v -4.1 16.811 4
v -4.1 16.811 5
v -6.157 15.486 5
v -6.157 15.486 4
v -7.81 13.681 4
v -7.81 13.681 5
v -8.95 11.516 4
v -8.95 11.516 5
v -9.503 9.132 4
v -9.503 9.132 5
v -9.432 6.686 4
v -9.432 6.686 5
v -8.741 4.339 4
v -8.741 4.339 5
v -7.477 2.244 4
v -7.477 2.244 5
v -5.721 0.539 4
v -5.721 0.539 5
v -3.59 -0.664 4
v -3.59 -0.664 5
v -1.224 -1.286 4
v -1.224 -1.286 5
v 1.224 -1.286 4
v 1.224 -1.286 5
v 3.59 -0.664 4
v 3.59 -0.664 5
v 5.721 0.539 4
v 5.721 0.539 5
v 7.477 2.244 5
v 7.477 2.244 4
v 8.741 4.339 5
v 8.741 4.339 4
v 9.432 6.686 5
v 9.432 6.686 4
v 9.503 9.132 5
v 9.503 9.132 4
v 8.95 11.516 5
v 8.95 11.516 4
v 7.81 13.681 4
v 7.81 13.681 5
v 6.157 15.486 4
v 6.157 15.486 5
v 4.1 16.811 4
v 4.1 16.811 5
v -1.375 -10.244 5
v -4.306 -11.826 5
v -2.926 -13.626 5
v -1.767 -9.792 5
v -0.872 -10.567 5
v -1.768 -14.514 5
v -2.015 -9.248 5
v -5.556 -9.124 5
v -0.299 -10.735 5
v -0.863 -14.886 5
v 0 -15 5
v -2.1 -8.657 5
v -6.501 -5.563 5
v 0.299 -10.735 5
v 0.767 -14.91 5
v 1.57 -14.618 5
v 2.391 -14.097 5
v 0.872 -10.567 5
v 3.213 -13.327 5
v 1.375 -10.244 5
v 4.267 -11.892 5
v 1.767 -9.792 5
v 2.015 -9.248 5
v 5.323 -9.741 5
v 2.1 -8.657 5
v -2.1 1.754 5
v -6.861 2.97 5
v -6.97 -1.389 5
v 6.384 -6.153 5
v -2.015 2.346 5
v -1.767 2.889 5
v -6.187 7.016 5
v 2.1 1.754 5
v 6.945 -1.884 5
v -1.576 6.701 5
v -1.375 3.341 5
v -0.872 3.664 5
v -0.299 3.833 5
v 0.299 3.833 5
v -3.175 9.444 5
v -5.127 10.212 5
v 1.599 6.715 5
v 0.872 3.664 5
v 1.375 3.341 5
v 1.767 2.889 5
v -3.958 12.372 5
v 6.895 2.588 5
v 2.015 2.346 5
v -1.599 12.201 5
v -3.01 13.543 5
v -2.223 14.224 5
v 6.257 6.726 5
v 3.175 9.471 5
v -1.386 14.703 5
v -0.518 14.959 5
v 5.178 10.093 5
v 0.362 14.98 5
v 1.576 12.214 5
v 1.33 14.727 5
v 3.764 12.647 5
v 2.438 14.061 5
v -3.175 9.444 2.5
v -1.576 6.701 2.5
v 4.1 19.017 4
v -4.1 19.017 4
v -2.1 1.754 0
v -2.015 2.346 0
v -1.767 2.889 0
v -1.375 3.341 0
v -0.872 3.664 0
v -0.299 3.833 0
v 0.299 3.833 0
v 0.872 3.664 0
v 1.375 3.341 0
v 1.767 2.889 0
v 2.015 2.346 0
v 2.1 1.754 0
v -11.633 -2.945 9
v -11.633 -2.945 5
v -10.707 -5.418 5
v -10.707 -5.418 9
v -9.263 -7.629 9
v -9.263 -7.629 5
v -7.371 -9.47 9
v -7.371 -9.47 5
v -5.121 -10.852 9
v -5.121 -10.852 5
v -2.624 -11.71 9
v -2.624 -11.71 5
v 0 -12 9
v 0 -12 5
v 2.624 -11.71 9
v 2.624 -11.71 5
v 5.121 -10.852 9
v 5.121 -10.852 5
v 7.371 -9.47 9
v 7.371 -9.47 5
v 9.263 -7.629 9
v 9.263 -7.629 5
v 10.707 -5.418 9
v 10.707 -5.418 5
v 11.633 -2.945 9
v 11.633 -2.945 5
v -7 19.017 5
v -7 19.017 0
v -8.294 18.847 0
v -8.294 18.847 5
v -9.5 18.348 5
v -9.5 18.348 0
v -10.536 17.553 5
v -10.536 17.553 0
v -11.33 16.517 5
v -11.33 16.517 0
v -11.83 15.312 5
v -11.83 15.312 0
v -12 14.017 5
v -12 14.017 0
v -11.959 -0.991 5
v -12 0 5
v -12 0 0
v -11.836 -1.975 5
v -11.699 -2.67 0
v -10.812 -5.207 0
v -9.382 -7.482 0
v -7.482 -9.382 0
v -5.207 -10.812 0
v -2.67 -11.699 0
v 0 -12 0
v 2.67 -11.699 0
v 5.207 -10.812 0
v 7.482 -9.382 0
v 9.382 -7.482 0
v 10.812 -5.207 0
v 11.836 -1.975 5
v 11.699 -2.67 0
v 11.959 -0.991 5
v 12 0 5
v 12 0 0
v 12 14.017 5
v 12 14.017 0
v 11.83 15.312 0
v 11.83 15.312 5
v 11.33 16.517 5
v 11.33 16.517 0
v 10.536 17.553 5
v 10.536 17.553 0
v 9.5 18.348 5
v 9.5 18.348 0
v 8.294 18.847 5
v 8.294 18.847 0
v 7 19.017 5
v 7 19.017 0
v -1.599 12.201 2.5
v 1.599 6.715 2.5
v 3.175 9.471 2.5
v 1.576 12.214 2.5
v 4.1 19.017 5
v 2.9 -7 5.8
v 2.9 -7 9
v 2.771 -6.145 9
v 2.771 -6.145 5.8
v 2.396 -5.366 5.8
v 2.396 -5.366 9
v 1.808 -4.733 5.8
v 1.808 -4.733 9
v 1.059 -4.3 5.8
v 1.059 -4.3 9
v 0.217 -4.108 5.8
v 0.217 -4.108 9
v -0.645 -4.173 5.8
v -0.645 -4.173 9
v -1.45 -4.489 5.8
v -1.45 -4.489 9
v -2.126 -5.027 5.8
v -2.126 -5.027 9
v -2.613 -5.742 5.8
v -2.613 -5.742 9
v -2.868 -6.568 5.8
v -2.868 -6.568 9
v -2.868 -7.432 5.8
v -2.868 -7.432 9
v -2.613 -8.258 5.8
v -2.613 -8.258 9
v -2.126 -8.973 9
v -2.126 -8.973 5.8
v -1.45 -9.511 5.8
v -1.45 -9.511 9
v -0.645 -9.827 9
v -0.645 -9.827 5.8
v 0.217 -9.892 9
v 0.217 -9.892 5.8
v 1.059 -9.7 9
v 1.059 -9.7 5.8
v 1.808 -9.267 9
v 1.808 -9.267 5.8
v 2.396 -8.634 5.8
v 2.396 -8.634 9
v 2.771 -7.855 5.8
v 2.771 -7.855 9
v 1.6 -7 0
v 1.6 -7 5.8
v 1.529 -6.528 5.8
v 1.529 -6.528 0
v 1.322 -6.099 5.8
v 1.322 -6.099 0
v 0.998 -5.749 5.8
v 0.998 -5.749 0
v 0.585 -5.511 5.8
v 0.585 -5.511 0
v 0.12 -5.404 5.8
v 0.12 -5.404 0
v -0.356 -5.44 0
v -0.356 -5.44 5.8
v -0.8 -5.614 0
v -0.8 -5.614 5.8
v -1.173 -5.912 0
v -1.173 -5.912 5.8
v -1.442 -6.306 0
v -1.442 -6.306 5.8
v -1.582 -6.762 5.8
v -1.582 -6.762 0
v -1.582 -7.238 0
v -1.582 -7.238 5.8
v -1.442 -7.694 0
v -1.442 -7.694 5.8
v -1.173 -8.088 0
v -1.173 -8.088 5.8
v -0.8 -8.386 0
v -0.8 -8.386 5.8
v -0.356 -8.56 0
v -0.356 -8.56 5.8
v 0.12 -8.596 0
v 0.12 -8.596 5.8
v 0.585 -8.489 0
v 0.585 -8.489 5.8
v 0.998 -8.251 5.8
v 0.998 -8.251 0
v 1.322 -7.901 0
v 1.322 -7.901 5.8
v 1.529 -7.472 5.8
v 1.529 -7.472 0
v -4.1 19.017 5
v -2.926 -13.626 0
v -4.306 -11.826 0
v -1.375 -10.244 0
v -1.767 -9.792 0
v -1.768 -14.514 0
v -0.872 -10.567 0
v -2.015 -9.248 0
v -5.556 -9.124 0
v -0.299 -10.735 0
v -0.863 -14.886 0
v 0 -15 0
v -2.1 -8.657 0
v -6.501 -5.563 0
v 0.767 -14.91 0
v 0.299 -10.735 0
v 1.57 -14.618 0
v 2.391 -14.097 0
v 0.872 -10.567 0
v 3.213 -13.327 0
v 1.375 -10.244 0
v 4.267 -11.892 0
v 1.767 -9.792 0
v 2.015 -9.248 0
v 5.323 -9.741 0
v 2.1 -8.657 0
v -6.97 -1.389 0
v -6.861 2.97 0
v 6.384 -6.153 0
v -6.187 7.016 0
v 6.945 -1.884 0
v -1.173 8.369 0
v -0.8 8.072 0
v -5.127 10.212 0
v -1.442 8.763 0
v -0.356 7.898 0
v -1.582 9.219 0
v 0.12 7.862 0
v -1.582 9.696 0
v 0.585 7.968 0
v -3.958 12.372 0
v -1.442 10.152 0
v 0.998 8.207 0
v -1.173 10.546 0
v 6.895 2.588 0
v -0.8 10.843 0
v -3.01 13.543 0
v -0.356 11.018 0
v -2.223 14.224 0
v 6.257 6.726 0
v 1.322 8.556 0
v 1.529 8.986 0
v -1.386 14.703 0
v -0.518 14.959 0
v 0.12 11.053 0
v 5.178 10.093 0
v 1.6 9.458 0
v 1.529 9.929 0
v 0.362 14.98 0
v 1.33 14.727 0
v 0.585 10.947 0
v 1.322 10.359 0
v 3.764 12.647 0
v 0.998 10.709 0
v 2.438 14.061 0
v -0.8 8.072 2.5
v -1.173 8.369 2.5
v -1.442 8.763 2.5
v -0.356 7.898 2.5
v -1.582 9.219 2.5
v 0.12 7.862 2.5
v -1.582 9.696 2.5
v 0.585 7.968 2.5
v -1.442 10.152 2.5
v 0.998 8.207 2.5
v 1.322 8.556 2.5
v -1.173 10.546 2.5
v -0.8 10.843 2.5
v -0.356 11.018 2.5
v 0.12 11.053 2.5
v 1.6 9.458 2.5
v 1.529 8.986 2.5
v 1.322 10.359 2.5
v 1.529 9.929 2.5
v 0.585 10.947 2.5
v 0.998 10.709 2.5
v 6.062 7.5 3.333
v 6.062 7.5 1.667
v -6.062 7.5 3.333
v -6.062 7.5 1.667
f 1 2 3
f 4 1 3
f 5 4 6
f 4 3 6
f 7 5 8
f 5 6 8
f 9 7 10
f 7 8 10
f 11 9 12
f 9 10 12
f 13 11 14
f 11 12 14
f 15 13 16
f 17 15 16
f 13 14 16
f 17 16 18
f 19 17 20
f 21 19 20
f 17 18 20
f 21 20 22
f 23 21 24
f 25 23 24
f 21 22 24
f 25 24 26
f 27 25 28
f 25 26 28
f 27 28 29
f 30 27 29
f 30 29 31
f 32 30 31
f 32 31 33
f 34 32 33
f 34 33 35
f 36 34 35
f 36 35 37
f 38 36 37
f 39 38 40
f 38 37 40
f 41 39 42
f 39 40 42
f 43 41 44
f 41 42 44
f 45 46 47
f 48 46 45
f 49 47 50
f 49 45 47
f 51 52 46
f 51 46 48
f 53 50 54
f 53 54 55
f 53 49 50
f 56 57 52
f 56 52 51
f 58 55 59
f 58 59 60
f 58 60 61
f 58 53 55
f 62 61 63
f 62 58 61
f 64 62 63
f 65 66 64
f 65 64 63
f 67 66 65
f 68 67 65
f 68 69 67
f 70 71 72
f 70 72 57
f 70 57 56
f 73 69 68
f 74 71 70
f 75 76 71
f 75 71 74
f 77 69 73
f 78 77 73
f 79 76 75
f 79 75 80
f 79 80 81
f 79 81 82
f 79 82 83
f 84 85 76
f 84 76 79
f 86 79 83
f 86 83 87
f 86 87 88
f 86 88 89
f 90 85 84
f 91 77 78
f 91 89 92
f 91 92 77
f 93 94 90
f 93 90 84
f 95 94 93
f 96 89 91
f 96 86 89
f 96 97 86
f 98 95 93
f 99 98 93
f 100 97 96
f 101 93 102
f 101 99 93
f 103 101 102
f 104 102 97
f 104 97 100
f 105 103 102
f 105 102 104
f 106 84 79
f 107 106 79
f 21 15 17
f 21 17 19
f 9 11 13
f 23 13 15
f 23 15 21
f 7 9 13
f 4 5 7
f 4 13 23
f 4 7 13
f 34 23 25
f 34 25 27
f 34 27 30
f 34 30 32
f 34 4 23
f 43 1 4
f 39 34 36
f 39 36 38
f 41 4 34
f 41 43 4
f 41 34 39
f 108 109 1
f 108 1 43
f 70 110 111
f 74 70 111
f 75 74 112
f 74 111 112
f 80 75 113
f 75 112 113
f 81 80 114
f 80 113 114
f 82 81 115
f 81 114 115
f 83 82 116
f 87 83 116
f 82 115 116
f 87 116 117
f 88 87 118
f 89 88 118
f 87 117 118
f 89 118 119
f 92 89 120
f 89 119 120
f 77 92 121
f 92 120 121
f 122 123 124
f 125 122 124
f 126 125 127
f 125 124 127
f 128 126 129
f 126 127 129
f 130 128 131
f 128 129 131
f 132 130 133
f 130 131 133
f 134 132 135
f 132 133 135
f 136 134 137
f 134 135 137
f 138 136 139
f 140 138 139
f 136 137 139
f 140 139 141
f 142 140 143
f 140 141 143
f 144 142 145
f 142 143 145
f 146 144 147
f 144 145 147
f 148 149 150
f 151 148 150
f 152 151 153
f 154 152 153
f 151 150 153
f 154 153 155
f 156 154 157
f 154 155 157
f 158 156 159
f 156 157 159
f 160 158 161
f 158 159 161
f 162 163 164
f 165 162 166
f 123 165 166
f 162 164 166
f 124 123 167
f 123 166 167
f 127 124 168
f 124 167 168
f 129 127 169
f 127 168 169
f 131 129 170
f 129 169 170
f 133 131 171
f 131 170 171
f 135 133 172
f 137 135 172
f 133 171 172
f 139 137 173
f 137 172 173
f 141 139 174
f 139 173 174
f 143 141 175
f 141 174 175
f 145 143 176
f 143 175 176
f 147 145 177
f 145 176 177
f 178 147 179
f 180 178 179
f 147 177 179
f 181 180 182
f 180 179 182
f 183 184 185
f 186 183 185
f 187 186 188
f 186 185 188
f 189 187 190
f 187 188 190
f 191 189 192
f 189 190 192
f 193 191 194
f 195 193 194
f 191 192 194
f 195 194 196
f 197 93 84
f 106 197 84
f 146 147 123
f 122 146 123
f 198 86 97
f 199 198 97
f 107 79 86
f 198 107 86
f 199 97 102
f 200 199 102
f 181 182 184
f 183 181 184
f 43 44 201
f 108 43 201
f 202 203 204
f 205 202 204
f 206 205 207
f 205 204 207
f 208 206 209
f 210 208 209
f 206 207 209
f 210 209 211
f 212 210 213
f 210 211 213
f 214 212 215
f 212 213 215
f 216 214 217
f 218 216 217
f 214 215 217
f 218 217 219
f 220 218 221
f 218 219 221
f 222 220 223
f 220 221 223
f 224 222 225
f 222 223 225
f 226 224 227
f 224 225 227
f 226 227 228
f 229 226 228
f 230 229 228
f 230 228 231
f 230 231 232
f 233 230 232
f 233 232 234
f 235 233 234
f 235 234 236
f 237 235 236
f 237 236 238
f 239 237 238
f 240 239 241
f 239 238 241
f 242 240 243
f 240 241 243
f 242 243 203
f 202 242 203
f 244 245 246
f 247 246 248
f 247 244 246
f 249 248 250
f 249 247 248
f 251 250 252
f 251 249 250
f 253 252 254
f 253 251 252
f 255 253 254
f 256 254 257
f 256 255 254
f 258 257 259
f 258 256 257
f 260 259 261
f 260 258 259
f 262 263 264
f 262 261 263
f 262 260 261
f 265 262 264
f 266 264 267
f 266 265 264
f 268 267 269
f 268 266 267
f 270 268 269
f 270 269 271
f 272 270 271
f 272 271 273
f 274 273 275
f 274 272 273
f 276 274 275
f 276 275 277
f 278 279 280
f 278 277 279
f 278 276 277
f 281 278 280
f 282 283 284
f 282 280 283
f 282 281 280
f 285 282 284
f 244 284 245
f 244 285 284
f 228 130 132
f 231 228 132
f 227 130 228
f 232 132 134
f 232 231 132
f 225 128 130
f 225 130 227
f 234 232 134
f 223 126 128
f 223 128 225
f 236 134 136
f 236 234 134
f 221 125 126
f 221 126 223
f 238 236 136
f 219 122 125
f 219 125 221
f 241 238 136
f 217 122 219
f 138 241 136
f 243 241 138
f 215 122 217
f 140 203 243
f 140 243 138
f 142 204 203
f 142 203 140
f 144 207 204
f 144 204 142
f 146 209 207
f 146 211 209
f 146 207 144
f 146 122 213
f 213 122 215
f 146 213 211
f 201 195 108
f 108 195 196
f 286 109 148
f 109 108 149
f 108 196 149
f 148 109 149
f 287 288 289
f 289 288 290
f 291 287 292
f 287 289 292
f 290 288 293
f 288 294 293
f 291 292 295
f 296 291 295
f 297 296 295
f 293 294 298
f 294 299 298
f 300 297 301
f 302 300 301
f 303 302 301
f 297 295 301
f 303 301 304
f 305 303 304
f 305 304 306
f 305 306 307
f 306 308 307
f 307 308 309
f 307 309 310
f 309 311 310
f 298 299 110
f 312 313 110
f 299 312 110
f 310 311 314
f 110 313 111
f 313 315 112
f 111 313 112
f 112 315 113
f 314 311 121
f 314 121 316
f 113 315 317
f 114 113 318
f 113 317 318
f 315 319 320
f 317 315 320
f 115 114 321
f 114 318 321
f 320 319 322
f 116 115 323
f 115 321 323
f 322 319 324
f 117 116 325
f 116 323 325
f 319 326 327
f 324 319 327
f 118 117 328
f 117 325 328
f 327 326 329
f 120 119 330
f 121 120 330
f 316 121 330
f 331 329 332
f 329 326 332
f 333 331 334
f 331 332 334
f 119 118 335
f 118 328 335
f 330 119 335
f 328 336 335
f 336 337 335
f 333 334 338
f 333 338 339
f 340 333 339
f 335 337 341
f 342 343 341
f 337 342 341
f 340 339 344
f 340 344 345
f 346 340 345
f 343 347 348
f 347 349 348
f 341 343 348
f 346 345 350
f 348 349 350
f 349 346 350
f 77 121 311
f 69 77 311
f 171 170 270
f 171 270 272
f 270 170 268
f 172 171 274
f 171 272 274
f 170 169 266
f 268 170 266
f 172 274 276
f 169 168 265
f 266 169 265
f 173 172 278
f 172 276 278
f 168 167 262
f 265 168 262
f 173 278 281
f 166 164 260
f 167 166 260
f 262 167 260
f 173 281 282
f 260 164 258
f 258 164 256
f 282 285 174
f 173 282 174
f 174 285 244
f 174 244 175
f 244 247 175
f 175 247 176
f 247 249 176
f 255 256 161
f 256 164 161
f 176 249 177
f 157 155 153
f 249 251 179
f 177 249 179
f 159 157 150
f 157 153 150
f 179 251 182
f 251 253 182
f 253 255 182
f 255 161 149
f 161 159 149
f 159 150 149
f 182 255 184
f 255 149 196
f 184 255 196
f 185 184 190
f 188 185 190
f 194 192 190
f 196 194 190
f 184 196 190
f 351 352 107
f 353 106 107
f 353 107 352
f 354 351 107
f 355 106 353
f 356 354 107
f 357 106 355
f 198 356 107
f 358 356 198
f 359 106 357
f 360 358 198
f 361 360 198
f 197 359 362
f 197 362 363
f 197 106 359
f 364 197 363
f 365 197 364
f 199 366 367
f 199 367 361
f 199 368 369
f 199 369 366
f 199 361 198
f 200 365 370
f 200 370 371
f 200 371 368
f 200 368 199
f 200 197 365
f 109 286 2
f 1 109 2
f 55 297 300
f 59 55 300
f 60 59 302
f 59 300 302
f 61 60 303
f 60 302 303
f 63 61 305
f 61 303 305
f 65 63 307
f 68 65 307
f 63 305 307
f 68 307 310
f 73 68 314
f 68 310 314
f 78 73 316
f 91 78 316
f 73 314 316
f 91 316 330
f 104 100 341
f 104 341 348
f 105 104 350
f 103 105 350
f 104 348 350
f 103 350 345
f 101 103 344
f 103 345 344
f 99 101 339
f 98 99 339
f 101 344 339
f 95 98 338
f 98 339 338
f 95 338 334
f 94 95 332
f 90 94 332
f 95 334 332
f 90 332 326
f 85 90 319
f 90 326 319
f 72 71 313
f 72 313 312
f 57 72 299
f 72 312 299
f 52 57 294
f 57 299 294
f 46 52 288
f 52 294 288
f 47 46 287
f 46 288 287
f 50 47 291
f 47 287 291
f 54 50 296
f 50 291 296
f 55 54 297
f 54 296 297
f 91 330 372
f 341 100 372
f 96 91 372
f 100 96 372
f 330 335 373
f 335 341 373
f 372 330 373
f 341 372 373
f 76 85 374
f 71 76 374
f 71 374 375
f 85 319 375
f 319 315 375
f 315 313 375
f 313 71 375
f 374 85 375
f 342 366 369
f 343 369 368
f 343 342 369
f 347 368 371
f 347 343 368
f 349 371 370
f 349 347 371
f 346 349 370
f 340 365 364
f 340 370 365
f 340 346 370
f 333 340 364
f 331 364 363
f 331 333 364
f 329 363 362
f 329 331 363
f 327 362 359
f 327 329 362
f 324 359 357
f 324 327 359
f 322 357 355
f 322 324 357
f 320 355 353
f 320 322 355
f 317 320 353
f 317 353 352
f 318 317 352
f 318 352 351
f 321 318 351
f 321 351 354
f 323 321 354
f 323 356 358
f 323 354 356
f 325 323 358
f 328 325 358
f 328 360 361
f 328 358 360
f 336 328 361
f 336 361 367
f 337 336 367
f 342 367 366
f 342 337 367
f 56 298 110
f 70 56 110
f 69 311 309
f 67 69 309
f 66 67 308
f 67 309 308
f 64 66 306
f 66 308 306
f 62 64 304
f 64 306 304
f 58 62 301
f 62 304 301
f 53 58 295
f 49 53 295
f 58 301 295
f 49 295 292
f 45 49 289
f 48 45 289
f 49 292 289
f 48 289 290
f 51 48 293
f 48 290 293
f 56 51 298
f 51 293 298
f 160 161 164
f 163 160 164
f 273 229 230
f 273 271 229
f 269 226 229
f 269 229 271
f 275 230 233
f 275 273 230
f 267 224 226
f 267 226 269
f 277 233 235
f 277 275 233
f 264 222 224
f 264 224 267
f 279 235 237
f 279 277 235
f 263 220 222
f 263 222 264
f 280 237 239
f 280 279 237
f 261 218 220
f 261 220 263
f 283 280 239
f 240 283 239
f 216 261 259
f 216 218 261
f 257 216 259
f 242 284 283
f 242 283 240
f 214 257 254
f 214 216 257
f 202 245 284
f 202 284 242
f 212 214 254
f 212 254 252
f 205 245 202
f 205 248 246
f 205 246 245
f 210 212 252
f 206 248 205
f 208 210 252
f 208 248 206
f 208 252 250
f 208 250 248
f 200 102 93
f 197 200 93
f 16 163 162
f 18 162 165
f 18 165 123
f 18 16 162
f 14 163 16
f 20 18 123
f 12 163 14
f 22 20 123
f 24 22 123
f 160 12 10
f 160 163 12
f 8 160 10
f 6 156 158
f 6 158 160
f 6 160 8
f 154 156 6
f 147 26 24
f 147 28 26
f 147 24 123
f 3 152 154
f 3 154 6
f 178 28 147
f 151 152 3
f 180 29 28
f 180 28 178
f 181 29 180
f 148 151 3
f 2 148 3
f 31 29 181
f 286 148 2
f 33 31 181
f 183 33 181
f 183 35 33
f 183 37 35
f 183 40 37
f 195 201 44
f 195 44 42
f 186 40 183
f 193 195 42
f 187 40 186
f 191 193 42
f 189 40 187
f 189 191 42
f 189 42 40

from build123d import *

# Parameters (mm, degrees)
F0_R      = 1.6
F1_DEPTH  = 5
F3_DEPTH  = 2.5
F4_R      = 1.6
F5_DEPTH  = 5
F6_R      = 1.6
F7_DEPTH  = 4
F9_DEPTH  = 1
F10_R     = 2.9
F11_DEPTH = 3.2


with BuildPart() as f1:
    # F0 (on Top) → F1 (new body)
    with BuildSketch(Plane.XY):
        with BuildLine():
            add(Edge.make_bspline(
                [(0, -15), (12.124355653, -15), (6.0621778265, 7.5), (0, 30), (-6.0621778265, 7.5), (-12.124355653, -15), (0, -15)],
                knots=[0, 0, 0, 2.0943951024, 2.0943951024, 4.1887902048, 4.1887902048, 6.2831853072, 6.2831853072, 6.2831853072], degree=2, weights=[1, 0.5, 1, 0.5, 1, 0.5, 1]))
        make_face()
        with BuildLine():
            ThreePointArc((-2.1, 1.7540045083), (0, 3.8540045083), (2.1, 1.7540045083))
            Line((2.1, 1.7540045083), (2.1, -8.6568603292))
            ThreePointArc((2.1, -8.6568603292), (0, -10.7568603292), (-2.1, -8.6568603292))
            Line((-2.1, -8.6568603292), (-2.1, 1.7540045083))
        make_face(mode=Mode.SUBTRACT)
        with Locations((0, 9.4576962292)):
            Circle(F0_R, mode=Mode.SUBTRACT)
    extrude(amount=F1_DEPTH)

    # F2 (on face) → F3 (cut)
    with BuildSketch(Plane.XY.offset(5)):
        Polygon((1.5994630503, 6.7145135368), (3.175397424, 9.471280517), (1.5759343737, 12.2144632094), (-1.5994630503, 12.2008789216), (-3.175397424, 9.4441119415), (-1.5759343737, 6.700929249), align=None)
    extrude(amount=-F3_DEPTH, mode=Mode.SUBTRACT)


with BuildPart() as f5:
    # F4 (on Top) → F5 (new body)
    with BuildSketch(Plane.XY):
        with BuildLine():
            Line((-12, 14.0174950817), (-12, 0))
            ThreePointArc((-12, 0), (0, -12), (12, 0))
            Line((12, 0), (12, 14.0174950817))
            ThreePointArc((12, 14.0174950817), (10.5355339059, 17.5530289876), (7, 19.0174950817))
            Line((7, 19.0174950817), (-7, 19.0174950817))
            ThreePointArc((-7, 19.0174950817), (-10.5355339059, 17.5530289876), (-12, 14.0174950817))
        make_face()
        with Locations((0, -7)):
            Circle(F4_R, mode=Mode.SUBTRACT)
    extrude(amount=F5_DEPTH)

    # F6 (on face) → F7 (join)
    with BuildSketch(Plane.XY.offset(5)):
        with BuildLine():
            Line((11.6328887184, -2.945488086), (-11.6328887184, -2.945488086))
            ThreePointArc((-11.6328887184, -2.945488086), (0, -12), (11.6328887184, -2.945488086))
        make_face()
        with Locations((0, -7)):
            Circle(F6_R, mode=Mode.SUBTRACT)
    extrude(amount=F7_DEPTH)

    # F8 (on face) → F9 (cut)
    with BuildSketch(Plane.XY.offset(5)):
        with BuildLine():
            Line((-4.1, 19.0174950817), (-4.1, 16.8106414017))
            ThreePointArc((-4.1, 16.8106414017), (0, -1.3644672933), (4.1, 16.8106414017))
            Line((4.1, 16.8106414017), (4.1, 19.0174950817))
            Line((4.1, 19.0174950817), (0, 19.0174950817))
            Line((0, 19.0174950817), (-4.1, 19.0174950817))
        make_face()
    extrude(amount=-F9_DEPTH, mode=Mode.SUBTRACT)

    # F10 (on face) → F11 (cut)
    with BuildSketch(Plane.XY.offset(9)):
        with Locations((0, -7)):
            Circle(F10_R)
    extrude(amount=-F11_DEPTH, mode=Mode.SUBTRACT)


solid = Compound([f1.part, f5.part])
